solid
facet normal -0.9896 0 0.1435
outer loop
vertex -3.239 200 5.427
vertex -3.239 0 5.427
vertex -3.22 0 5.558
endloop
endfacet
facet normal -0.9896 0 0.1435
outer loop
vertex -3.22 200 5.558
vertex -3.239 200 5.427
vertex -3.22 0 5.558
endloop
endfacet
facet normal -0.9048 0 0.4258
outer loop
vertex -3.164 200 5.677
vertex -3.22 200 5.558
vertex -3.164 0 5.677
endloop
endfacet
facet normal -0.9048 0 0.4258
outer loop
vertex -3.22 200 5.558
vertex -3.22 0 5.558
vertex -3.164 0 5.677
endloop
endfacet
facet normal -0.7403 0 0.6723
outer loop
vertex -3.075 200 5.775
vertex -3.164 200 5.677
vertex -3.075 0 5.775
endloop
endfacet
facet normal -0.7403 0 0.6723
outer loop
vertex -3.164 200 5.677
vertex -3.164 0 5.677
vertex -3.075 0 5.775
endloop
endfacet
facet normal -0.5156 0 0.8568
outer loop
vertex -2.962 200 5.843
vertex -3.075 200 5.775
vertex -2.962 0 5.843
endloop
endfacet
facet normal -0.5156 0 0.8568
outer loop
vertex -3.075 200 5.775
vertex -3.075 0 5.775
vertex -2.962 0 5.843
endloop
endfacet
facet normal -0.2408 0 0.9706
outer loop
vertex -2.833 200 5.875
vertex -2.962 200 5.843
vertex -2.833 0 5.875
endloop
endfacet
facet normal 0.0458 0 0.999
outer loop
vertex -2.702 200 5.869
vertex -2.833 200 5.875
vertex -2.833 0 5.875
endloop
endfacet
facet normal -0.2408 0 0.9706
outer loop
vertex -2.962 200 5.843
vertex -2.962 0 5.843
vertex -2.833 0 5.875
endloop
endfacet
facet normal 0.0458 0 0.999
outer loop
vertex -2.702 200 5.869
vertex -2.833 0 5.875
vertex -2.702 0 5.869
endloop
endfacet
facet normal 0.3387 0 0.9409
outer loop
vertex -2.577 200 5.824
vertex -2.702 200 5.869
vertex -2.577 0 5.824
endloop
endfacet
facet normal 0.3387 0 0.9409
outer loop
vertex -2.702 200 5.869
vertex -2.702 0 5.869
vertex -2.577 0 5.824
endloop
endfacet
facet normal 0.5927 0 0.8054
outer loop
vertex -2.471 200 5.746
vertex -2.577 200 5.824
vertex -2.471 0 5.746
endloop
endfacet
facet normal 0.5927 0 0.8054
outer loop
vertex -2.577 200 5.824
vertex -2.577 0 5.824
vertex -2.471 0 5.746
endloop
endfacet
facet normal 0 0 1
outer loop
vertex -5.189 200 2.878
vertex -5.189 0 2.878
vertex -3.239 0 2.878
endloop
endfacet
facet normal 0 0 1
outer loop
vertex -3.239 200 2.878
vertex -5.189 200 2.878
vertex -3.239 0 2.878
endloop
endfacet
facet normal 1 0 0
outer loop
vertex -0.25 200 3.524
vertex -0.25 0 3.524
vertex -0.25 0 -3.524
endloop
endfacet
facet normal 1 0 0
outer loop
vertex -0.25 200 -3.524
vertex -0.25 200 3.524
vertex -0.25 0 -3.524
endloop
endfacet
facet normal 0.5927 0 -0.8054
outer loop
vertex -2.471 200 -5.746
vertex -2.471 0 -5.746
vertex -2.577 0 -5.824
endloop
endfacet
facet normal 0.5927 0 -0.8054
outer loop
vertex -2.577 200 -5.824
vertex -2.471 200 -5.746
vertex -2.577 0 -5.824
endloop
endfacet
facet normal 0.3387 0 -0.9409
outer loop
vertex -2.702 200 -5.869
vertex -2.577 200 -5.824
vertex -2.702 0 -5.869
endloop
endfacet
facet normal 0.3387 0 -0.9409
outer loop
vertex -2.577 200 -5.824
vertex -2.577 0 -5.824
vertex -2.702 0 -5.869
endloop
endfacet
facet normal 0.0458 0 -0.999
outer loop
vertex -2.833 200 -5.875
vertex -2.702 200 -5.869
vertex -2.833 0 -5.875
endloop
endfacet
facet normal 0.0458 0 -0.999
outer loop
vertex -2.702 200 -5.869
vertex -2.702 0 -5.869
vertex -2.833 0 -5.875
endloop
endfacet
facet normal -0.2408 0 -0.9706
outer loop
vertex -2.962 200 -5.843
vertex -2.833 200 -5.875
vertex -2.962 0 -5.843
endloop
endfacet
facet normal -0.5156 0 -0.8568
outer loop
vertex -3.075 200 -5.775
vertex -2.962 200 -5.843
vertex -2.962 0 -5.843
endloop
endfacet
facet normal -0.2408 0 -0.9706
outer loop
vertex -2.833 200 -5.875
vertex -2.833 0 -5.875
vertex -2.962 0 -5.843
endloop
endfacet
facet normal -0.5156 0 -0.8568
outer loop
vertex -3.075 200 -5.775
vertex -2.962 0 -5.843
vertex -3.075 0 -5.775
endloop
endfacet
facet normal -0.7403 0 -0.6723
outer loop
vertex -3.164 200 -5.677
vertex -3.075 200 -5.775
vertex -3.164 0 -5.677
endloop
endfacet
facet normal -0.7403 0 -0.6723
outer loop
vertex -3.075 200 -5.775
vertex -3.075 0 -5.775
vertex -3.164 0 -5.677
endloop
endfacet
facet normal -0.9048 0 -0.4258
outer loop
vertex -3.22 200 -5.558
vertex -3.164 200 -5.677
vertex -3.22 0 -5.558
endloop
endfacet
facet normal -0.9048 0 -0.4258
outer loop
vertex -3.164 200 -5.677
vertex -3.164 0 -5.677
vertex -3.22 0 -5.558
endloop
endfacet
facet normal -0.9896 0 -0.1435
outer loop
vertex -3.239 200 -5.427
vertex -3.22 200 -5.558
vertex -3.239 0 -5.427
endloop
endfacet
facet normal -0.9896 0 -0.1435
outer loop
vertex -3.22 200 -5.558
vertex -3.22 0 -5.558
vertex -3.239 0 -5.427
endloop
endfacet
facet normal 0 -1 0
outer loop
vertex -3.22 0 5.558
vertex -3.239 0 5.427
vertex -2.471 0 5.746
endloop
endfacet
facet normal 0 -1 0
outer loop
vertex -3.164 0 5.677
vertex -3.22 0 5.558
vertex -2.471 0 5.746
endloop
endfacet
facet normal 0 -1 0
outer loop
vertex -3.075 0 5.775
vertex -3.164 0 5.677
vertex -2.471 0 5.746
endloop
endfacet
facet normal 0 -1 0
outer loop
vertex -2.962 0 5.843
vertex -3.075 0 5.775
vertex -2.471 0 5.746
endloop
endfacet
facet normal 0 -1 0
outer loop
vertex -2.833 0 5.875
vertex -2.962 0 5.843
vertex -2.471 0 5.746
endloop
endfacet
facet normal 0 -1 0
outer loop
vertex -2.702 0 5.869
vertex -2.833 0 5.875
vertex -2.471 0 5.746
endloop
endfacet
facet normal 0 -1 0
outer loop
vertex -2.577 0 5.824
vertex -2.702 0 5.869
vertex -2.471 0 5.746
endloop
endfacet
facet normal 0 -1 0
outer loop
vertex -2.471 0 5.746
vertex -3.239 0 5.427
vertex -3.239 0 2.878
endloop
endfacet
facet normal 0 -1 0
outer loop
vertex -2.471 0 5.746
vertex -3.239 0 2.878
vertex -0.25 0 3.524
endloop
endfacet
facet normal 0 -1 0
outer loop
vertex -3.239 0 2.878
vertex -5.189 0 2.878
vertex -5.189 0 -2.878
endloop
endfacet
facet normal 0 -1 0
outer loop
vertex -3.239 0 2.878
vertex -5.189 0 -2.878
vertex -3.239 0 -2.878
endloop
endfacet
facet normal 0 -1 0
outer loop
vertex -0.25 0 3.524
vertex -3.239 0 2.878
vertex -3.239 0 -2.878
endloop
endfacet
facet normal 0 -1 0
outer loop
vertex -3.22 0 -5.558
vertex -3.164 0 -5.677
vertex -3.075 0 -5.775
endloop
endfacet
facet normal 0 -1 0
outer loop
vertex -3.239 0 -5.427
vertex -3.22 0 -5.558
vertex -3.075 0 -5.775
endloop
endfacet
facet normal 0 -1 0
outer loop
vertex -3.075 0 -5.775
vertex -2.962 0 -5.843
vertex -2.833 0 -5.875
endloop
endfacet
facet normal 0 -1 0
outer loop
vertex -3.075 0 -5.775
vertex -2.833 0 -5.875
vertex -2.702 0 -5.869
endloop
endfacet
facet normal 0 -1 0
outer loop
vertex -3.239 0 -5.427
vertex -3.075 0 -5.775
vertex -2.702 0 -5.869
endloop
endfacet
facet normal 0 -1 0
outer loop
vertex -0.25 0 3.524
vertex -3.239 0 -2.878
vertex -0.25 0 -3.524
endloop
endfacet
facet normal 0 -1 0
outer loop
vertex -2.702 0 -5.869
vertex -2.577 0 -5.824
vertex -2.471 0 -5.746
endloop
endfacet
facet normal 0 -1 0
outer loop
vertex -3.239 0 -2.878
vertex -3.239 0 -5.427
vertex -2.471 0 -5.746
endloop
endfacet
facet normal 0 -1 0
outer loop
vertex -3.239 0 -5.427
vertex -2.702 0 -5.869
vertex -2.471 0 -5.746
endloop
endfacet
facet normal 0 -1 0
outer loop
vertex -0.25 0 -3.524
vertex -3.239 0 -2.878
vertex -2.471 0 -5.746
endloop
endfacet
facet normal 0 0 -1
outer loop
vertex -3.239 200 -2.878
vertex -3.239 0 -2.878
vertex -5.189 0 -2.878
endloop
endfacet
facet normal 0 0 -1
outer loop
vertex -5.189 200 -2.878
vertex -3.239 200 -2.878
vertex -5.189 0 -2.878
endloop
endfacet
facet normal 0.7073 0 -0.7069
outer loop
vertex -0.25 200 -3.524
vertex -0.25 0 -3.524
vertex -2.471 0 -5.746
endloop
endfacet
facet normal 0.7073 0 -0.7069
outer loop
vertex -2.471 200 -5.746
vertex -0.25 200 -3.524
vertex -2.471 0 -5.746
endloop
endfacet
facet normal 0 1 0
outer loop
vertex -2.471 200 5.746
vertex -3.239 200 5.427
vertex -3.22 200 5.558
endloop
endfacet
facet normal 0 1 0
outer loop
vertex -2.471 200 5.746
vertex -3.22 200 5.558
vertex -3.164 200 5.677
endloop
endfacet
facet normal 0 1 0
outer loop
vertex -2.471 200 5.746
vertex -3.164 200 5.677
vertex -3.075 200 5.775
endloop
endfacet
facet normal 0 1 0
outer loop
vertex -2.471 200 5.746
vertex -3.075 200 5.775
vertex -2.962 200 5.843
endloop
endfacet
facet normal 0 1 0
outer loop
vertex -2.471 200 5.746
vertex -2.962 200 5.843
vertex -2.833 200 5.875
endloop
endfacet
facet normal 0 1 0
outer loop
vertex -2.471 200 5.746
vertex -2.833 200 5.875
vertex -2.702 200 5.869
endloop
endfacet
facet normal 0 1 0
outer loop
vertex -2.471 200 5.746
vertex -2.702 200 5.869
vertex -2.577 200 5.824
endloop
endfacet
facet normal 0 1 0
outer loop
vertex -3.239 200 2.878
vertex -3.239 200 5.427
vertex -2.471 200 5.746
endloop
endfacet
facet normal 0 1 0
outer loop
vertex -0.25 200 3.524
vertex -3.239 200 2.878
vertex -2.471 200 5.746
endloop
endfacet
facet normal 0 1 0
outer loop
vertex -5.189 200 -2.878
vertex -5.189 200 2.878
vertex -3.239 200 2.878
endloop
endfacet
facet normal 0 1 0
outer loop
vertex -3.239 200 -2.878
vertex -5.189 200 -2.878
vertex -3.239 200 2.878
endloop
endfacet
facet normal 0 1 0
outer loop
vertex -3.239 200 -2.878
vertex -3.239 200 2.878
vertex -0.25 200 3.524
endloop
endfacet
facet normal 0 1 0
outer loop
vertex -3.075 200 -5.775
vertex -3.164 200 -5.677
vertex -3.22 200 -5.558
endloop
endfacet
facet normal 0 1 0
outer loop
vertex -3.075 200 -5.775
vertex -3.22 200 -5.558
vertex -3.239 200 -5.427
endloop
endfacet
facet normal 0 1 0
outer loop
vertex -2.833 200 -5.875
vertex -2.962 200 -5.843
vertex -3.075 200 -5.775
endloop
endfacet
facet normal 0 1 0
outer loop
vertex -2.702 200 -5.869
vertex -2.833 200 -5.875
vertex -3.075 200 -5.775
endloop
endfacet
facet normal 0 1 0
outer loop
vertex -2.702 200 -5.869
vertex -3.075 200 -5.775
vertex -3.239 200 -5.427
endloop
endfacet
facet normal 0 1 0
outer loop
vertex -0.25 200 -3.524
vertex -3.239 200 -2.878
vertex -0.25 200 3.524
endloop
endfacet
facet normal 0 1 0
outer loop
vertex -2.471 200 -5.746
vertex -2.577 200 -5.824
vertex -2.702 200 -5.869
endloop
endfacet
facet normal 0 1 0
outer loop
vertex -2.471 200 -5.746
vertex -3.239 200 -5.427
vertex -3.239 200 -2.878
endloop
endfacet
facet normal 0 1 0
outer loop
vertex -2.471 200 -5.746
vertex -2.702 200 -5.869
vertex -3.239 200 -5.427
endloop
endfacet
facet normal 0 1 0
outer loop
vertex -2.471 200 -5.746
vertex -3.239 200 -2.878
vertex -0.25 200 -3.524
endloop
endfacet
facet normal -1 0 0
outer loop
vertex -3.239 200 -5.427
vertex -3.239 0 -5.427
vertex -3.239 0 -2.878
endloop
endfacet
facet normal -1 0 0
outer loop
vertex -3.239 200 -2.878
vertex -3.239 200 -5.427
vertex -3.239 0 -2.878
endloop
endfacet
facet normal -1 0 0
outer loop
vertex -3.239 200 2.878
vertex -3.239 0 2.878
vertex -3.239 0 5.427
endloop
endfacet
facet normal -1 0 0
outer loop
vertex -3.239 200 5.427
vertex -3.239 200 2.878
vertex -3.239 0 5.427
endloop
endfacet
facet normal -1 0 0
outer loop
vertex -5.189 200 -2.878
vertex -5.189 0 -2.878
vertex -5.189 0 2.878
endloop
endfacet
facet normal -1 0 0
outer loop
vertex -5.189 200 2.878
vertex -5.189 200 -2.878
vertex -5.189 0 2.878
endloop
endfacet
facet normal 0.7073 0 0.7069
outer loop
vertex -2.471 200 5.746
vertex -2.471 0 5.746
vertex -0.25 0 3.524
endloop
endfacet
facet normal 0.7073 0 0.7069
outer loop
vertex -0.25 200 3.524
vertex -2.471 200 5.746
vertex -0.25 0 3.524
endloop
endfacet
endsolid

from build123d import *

# Parameters (mm, degrees)
BOSS_EXTRUDE1_DEPTH = 200


with BuildPart() as part:
    # Sketch1 → Boss-Extrude1 (new body)
    with BuildSketch(Plane(origin=(0, 0, 0), x_dir=(1, 0, 0), z_dir=(0, 1, 0))):
        with BuildLine():
            Line((-3.239339866, -2.878050905), (-3.239339866, -5.427441221))
            ThreePointArc((-3.239339866, -5.427441221), (-2.961547411, -5.843187011), (-2.471141815, -5.745639273))
            Line((-2.471141815, -5.745639273), (-0.25, -3.524497458))
            Line((-0.25, -3.524497458), (-0.25, 3.524497458))
            Line((-0.25, 3.524497458), (-2.471141814, 5.745639272))
            ThreePointArc((-2.471141814, 5.745639272), (-2.961547408, 5.84318701), (-3.239339864, 5.427441222))
            Line((-3.239339864, 5.427441222), (-3.239339864, 2.878050849))
            Line((-3.239339864, 2.878050849), (-4.939339838, 2.878050849))
            Line((-4.939339838, 2.878050849), (-5.189339838, 2.878050849))
            Line((-5.189339838, 2.878050849), (-5.189339838, -2.878050905))
            Line((-5.189339838, -2.878050905), (-3.239339866, -2.878050905))
        make_face()
    extrude(amount=BOSS_EXTRUDE1_DEPTH)


solid = part.part
